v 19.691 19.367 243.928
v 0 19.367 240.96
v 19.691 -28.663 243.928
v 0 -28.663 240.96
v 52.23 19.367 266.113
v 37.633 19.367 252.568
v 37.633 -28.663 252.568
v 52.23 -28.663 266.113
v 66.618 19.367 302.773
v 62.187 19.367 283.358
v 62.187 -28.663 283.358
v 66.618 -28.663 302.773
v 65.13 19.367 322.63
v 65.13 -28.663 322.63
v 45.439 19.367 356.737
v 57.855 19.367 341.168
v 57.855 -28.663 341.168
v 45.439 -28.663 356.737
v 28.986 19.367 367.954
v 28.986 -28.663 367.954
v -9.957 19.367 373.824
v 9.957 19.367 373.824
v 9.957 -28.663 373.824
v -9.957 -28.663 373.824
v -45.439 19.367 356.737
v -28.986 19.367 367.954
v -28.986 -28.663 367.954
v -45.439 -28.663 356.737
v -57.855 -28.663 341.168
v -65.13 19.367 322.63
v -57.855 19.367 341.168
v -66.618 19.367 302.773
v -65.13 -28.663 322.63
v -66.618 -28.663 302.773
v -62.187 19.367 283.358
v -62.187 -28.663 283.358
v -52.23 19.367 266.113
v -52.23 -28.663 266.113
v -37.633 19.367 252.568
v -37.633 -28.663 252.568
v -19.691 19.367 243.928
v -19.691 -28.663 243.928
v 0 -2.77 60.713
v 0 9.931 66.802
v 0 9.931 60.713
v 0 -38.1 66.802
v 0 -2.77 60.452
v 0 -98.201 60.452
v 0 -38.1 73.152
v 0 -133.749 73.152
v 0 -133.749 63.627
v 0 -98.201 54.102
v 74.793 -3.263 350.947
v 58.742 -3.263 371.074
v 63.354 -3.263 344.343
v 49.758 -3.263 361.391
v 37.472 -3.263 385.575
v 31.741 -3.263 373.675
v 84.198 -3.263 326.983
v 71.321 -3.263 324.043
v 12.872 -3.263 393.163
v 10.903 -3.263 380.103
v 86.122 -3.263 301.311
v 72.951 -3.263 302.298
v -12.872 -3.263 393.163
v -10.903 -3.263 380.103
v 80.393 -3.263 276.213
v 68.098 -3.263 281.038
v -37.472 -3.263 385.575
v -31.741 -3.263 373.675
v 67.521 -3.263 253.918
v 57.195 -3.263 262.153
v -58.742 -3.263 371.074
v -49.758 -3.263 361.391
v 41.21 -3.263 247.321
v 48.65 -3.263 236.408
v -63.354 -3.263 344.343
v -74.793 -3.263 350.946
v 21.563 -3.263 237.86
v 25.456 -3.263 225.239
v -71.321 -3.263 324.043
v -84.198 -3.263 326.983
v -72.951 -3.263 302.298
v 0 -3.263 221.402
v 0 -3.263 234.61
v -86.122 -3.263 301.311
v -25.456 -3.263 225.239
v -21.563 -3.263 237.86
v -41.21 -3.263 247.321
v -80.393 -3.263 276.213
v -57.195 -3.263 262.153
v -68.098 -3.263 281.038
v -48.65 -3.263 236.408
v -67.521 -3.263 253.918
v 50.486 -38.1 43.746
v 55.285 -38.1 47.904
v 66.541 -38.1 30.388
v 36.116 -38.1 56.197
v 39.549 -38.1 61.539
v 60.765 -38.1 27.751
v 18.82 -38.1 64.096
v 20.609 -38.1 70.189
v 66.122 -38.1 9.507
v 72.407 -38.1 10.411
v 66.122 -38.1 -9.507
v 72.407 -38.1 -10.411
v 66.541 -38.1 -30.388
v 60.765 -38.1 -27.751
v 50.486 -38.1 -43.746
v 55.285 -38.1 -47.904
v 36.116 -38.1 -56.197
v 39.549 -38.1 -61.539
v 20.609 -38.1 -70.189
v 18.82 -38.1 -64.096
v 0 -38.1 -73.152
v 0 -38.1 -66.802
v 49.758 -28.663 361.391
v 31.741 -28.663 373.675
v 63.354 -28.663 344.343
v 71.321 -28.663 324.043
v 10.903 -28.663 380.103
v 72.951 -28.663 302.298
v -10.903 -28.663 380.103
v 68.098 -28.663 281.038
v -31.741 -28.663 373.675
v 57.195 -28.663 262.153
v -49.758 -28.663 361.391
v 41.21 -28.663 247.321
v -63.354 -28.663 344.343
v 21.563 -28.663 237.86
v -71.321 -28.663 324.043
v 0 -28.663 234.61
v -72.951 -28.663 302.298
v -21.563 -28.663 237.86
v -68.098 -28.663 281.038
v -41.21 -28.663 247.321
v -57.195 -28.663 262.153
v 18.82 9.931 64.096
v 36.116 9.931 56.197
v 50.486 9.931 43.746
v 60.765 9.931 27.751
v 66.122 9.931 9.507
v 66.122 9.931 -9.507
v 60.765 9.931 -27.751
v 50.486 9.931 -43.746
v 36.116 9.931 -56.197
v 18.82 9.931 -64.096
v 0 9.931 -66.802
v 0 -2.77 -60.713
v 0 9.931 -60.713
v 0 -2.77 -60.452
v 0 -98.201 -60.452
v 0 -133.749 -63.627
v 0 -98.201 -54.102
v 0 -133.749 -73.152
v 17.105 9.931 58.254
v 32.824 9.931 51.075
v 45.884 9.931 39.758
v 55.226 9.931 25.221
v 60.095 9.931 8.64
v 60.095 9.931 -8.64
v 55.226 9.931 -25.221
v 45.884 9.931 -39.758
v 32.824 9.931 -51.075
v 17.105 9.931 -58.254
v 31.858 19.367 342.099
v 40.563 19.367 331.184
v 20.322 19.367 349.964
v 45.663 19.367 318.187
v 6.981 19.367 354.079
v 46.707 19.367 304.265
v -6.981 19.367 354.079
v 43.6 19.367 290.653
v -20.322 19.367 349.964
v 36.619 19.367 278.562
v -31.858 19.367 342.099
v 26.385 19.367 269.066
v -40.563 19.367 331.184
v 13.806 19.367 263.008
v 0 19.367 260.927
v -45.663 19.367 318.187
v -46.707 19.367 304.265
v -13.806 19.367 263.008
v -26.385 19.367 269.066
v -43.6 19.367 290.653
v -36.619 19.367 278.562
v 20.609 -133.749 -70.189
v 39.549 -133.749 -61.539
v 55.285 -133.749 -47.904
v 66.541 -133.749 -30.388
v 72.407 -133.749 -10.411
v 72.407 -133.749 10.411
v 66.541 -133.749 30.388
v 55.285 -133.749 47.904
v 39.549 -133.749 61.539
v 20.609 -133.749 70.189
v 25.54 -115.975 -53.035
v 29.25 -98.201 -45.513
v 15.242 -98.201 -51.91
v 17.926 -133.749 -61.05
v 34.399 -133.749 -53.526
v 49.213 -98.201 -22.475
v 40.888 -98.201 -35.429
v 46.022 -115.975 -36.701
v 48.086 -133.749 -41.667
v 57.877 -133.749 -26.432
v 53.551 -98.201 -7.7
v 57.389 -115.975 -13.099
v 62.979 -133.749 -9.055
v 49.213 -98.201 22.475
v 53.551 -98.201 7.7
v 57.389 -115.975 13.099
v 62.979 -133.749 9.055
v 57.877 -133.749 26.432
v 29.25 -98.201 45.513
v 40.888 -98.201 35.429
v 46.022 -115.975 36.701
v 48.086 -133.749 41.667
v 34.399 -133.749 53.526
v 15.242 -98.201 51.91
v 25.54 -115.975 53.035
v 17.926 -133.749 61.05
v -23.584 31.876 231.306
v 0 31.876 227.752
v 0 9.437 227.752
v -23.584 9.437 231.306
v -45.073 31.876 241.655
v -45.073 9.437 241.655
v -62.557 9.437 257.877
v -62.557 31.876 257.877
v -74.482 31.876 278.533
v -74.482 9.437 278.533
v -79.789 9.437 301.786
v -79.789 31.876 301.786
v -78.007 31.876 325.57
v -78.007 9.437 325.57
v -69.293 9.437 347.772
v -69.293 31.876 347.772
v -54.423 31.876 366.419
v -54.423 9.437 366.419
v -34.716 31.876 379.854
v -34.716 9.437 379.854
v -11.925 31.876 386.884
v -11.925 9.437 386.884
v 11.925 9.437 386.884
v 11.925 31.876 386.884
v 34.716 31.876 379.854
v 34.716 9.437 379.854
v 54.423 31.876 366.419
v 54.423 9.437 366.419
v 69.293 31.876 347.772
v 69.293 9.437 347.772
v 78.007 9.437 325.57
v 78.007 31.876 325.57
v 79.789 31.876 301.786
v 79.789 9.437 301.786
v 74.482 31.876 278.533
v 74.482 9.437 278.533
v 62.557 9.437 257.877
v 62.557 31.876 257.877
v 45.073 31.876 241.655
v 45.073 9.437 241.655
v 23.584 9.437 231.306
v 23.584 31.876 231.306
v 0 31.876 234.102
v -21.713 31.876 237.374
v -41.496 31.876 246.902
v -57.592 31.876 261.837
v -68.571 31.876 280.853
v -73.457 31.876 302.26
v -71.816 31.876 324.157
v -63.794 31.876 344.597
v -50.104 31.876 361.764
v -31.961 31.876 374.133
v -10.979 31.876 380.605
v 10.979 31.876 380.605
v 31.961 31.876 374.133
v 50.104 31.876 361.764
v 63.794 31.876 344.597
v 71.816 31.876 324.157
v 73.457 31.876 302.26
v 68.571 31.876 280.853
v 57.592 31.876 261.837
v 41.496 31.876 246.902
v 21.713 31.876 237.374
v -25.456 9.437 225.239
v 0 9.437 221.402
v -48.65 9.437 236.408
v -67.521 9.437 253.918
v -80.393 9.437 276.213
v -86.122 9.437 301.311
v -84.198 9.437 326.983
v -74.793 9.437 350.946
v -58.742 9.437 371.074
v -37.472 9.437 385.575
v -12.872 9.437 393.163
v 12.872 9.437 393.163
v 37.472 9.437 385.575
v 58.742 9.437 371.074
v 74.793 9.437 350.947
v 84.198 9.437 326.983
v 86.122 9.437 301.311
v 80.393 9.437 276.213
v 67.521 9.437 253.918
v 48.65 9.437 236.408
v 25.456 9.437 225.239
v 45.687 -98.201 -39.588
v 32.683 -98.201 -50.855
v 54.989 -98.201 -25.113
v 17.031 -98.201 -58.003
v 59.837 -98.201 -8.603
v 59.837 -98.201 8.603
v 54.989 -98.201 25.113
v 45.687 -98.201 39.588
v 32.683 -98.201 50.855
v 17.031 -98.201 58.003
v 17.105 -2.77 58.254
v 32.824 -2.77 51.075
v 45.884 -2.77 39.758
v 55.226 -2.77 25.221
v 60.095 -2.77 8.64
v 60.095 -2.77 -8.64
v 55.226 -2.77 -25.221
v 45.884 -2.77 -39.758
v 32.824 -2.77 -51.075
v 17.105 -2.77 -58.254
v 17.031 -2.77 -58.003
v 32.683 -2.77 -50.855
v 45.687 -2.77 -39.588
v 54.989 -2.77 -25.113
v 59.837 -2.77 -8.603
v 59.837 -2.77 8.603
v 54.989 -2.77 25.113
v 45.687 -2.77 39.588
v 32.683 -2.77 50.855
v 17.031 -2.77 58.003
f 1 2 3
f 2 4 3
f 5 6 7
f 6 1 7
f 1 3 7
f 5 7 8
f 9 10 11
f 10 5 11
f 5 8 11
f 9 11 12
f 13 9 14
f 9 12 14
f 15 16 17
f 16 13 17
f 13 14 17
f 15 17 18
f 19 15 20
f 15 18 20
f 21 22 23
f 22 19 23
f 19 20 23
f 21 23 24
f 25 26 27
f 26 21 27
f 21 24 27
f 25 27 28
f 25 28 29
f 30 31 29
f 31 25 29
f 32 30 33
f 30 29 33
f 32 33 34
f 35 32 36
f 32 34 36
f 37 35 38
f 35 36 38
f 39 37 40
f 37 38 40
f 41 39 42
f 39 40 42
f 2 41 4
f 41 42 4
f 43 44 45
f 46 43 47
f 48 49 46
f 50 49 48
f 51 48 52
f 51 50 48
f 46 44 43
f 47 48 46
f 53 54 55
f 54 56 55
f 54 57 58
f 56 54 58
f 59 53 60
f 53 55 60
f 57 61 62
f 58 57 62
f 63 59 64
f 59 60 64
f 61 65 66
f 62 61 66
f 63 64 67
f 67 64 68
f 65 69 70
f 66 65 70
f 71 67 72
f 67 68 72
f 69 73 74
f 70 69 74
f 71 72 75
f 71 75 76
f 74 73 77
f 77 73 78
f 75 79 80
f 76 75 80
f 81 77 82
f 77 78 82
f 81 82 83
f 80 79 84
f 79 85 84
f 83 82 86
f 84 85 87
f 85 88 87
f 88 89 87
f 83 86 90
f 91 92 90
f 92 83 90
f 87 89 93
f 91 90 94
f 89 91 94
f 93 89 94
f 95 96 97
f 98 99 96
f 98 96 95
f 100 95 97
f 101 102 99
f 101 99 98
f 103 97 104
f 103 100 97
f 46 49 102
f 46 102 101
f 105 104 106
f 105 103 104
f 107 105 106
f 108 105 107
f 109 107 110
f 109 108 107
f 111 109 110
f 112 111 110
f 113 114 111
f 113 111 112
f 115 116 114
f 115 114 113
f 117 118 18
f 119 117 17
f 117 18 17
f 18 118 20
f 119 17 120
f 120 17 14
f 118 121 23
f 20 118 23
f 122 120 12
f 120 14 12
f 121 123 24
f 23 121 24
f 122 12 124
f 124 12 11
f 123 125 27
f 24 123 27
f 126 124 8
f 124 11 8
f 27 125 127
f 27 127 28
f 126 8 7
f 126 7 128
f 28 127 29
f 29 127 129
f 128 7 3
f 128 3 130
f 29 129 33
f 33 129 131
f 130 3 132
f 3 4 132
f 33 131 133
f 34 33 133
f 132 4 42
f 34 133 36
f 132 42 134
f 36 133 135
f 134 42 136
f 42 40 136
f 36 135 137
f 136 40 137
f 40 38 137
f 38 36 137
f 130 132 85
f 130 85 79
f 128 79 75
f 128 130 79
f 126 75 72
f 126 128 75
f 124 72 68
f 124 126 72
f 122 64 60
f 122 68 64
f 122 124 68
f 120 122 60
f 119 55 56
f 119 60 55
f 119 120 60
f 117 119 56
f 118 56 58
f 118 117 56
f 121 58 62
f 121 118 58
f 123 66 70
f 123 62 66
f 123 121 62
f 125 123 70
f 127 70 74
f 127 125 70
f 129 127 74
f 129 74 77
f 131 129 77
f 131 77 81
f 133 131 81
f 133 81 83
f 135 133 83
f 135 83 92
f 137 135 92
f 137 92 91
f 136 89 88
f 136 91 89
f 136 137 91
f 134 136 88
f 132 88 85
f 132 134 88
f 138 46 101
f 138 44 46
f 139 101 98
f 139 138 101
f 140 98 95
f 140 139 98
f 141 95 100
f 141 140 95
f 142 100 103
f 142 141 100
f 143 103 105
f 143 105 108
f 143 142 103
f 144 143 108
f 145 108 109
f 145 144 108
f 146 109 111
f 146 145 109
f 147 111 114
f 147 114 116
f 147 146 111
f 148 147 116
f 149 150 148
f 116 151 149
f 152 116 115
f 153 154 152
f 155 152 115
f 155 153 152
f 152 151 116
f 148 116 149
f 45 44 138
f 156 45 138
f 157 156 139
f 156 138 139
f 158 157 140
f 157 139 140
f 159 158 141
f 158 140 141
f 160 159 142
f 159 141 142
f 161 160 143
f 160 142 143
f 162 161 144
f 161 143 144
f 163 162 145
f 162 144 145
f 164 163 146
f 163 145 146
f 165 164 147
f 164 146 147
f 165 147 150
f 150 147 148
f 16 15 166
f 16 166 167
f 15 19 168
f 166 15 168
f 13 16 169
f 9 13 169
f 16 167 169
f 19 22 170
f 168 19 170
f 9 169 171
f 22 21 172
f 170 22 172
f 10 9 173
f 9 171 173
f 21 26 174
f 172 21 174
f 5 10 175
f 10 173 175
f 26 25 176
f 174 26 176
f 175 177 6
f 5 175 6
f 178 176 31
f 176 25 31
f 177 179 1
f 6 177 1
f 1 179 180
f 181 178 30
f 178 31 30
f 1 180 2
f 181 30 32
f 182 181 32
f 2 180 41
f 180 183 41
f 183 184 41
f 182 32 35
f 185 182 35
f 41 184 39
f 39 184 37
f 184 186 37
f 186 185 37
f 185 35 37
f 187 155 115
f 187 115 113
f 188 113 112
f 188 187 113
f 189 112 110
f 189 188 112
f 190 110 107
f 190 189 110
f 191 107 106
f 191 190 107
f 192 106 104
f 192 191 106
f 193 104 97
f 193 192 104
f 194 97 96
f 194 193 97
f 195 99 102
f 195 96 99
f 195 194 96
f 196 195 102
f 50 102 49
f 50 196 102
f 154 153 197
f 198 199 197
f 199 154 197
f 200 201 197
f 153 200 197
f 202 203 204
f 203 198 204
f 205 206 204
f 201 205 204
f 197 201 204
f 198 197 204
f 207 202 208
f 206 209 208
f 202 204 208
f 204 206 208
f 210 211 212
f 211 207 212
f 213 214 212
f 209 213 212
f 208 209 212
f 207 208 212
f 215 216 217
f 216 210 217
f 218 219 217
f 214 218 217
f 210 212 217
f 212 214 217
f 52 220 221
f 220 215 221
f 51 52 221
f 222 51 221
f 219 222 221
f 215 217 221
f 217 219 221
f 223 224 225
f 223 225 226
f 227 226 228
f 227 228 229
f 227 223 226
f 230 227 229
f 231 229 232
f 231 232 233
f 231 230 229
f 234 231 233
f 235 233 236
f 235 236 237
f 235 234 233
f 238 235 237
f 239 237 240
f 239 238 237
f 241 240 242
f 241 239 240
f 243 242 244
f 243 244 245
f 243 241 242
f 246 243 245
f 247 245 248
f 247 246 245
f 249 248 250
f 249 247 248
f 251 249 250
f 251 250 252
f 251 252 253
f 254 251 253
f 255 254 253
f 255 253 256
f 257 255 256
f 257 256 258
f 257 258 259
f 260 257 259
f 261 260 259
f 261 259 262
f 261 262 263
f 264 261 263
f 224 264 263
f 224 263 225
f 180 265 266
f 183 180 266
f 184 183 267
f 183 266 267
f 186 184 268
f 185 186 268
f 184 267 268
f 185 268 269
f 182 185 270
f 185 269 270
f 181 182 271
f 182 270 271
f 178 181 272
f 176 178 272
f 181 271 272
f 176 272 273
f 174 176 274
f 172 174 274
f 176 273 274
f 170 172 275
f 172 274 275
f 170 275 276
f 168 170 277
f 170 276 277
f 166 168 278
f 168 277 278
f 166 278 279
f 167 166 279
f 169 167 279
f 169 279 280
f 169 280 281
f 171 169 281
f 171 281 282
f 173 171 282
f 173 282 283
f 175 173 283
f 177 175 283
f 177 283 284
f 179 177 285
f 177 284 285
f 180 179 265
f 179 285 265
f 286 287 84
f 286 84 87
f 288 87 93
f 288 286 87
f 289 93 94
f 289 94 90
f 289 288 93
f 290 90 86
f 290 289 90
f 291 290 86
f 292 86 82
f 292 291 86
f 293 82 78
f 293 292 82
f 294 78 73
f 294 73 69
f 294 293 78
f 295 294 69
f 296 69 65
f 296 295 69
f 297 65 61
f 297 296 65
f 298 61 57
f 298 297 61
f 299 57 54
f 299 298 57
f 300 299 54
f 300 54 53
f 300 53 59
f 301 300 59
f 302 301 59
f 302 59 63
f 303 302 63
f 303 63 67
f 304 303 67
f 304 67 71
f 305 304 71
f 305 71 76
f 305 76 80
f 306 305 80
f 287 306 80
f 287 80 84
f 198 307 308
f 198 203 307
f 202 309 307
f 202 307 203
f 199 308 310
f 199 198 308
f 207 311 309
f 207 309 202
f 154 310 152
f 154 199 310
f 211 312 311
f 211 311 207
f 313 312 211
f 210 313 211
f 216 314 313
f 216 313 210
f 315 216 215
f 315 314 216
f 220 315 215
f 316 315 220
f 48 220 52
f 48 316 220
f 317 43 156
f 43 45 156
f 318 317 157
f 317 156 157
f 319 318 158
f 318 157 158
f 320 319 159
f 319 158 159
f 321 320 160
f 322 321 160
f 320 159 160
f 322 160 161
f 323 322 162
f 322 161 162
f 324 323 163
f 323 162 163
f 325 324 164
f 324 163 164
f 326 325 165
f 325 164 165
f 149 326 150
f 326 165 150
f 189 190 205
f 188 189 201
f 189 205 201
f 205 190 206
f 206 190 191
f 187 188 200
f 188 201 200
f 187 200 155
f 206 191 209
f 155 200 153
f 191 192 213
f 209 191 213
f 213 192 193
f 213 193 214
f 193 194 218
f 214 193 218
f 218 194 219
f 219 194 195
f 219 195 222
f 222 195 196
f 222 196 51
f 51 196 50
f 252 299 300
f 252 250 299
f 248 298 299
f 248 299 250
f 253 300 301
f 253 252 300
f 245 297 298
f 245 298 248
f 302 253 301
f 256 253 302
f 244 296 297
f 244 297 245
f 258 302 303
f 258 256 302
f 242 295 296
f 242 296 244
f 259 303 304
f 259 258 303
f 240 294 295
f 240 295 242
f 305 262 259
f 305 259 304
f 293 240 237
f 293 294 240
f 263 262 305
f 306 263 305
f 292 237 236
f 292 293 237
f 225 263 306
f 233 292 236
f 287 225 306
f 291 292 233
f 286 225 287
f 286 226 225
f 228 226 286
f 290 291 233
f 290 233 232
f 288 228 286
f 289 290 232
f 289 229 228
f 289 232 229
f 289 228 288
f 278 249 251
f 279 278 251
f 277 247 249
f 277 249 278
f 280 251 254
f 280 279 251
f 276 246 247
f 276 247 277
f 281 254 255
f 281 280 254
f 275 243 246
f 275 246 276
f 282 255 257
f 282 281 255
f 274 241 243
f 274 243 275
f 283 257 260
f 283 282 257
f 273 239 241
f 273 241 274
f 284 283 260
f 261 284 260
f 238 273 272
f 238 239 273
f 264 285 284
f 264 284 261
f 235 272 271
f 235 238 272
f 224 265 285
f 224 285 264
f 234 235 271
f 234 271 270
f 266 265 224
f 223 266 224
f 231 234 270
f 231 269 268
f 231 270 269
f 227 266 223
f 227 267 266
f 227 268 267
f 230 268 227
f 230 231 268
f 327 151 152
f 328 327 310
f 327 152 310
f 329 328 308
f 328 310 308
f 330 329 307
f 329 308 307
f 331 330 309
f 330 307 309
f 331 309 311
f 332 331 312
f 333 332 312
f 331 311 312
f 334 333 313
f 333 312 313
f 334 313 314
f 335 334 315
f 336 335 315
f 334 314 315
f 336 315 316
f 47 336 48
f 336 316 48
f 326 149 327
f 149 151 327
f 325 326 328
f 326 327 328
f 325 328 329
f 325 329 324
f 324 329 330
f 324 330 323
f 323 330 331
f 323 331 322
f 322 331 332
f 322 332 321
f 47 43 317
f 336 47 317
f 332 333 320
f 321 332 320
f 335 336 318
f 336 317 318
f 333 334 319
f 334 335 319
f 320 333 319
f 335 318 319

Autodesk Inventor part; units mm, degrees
ref_plane "YZ Plane" through (0, 0, 0) normal (1, 0, 0) x (0, 1, 0)
ref_plane "XZ Plane" through (0, 0, 0) normal (0, 1, 0) x (-1, 0, 0)
ref_plane "XY Plane" through (0, 0, 0) normal (0, 0, 1) x (1, 0, 0)
sketch "Sketch1" plane through (0, 0, 0) normal (0, 0, 1) x (1, 0, 0)
  line L0 (0, 25.4) -> (-28.702, 25.4) construction
  line L1 (0, 25.4) -> (-86.36, 25.4) construction
  line L2 (-86.36, 25.4) -> (-80.01, 25.4) construction
  line L3 (-80.01, 25.4) -> (-73.66, 22.4389) construction
  line L4 (-80.01, 25.4) -> (-80.01, 22.4389) construction
  line L5 (-80.01, 0) -> (-86.36, 0)
  line L6 (-28.702, 59.6457) -> (-28.702, -91.9304) construction
  arc A0 (-28.9184, -4.2142) -> (-32.3684, 3.1843) centre (-35.052, -2.5707) ccw
  line L7 (-67.31, -147.4937) -> (-28.9184, -4.2142)
  line L8 (-80.01, 22.4389) -> (-73.66, 22.4389)
  line L9 (-80.01, 22.4389) -> (-80.01, 0)
  line L10 (-73.66, 22.4389) -> (-32.3684, 3.1843)
  line L11 (-28.702, -2.5707) -> (-60.452, -2.5707) construction
  line L12 (-60.452, 16.28) -> (-60.452, -121.8993) construction
  line L13 (-60.452, -121.8993) -> (-54.102, -121.8993) construction
  line L14 (-54.102, -121.8993) -> (-54.102, -98.2008) construction
  line L15 (-54.102, -98.2008) -> (-60.452, -98.2008)
  line L16 (-60.452, 16.28) -> (-60.452, 6.755) construction
  line L17 (-60.452, 16.28) -> (-60.452, 9.93) construction
  line L18 (-60.452, 9.93) -> (-46.8344, 9.93)
  line L19 (-60.452, 9.93) -> (-60.452, -98.2008)
  line L20 (-86.36, 0) -> (-86.36, -12.7) construction
  line L21 (-60.452, -12.7) -> (-73.152, -12.7) construction
  line L22 (-86.36, -12.7) -> (-86.36, -25.4) construction
  line L23 (-86.36, -25.4) -> (-86.36, -88.9) construction
  line L24 (-86.36, -88.9) -> (-73.66, -88.9) construction
  line L25 (-73.66, -88.9) -> (-73.66, -25.4) construction
  line L26 (-86.36, -25.4) -> (-73.66, -25.4)
  line L27 (-73.66, -25.4) -> (-73.66, -88.9)
  line L28 (-73.66, -88.9) -> (-86.36, -88.9)
  line L29 (-86.36, -12.7) -> (-73.152, -12.7)
  line L30 (-73.152, -133.7486) -> (-63.627, -133.7486)
  line L31 (-73.66, -88.9) -> (-73.66, -147.4937)
  line L32 (-73.66, -147.4937) -> (-67.31, -147.4937)
  line L33 (-73.152, -12.7) -> (-73.152, -133.7486)
  line L34 (-80.01, -25.4) -> (-80.01, -31.3436)
  line L35 (-80.01, -31.3436) -> (-86.36, -31.3436)
  line L36 (-86.36, 0) -> (-86.36, -25.4)
  line L37 (-86.36, -31.3436) -> (-86.36, -88.9)
  line L38 (0, -319.0244) -> (0, 122.7573) projected
  point P0 (0, 0)
  point P1 (-86.36, -255.9127)
  point P2 (-76.835, 22.4389)
  dimension "d0" = 28.702
  dimension "d1" = 86.36
  dimension "d2" = 6.35
  dimension "d3" = 25
  dimension "d5" = 25.4
  dimension "d6" = 25.4
  dimension "d8" = 12.7
  dimension "d11" = 6.35
  dimension "d12" = 31.75
  dimension "d13" = 6.35
  dimension "d15" = 6.35
  dimension "d16" = 12.7
  dimension "d17" = 12.7
  dimension "d18" = 12.7
  dimension "d19" = 63.5
  dimension "d20" = 12.7
  dimension "d22" = 9.525
  dimension "d23" = 6.35
  dimension "d25" = 5.9436
  dimension "d26" = 15
revolve "Revolution2" add sketch "Sketch1" angle 360 about axis through (0, -10, 0) along (0, 1, 0) contours L9 L8 L10 L18 L19 L15 L7 L30 L33 L29 L36 L5
sketch "Sketch2" plane through (0, 0, 0) normal (0, 1, 0) x (-1, 0, 0)
  line L0 (0, -114.5678) -> (107.9834, -114.5678)
  line L1 (107.9834, -114.5678) -> (107.9834, 108.3126)
  line L2 (107.9834, 108.3126) -> (0, 108.3126)
  line L3 (0, 108.3126) -> (0, -114.5678)
  point P0 (0, 0)
extrude "Extrusion1" cut sketch "Sketch2" along normal through all both and the other way through all
sketch "Sketch3" plane through (0, -133.7486, -73.152) normal (-1, 0, 0) x (0, 0, 1)
  line L0 (6.35, 143.6785) -> (6.35, 121.0486)
  line L1 (6.35, 121.0486) -> (6.35, 95.6486)
  line L2 (0, 95.6486) -> (6.35, 95.6486)
  line L3 (0, 121.0486) -> (-13.208, 121.0486)
  line L4 (-13.208, 121.0486) -> (-13.208, 133.7486) projected
  line L5 (-13.208, 121.0486) -> (-13.208, 133.7486)
  line L6 (-13.208, 133.7486) -> (-6.858, 133.7486)
  line L7 (-6.858, 133.7486) -> (-6.858, 156.1875)
  line L8 (-0.508, 156.1875) -> (26.3176, 143.6785) projected
  line L9 (-6.858, 156.1875) -> (-0.508, 156.1875)
  line L10 (-0.508, 156.1875) -> (26.3176, 143.6785)
  line L11 (12.7, 143.6785) -> (26.3176, 143.6785)
  line L12 (6.35, 143.6785) -> (12.7, 143.6785)
  line L13 (314.1117, 153.1152) -> (314.1117, 130.4853)
  line L14 (314.1117, 130.4853) -> (314.1117, 105.0853)
  line L15 (307.7617, 105.0853) -> (314.1117, 105.0853)
  line L16 (307.7617, 130.4853) -> (294.5537, 130.4853)
  line L17 (294.5537, 130.4853) -> (294.5537, 143.1853)
  line L18 (294.5537, 143.1853) -> (300.9037, 143.1853)
  line L19 (300.9037, 143.1853) -> (300.9037, 165.6242)
  line L20 (307.2537, 165.6242) -> (334.0793, 153.1152)
  line L21 (300.9037, 165.6242) -> (307.2537, 165.6242)
  line L22 (320.4617, 153.1152) -> (334.0793, 153.1152)
  line L23 (314.1117, 153.1152) -> (320.4617, 153.1152)
  line L24 (334.0793, 153.1152) -> (380.9169, 153.1152) construction
  line L25 (380.9169, 153.1152) -> (380.9169, 203.9215) construction
  line L26 (307.7617, 130.4853) -> (307.7617, 105.0853)
  line L27 (0, 121.0486) -> (0, 95.6486)
  line L28 (0, 0) -> (0, 121.0486) projected
  point P0 (73.152, 133.7486)
  dimension "d32" = 6.35
  dimension "d34" = 6.35
  dimension "d35" = 46.8376
revolve "Revolution3" add sketch "Sketch3" angle 360 about axis through (0, 19.3666, 307.7649) along (0, 1, 0) contours L13 L14 L15 L26 L16 L17 L18 L19 L21 L20 L22 L23
sketch "Sketch6" plane through (0, -133.7486, -73.152) normal (-1, 0, 0) x (0, 0, 1)
  line L0 (0, 121.0486) -> (0, 95.6486)
  line L1 (0, 95.6486) -> (6.35, 95.6486)
  line L2 (0, 121.0486) -> (-13.208, 121.0486)
  line L3 (-13.208, 121.0486) -> (-13.208, 133.7486) projected
  line L4 (-13.208, 121.0486) -> (-13.208, 133.7486)
  line L5 (-13.208, 133.7486) -> (-6.858, 133.7486)
  line L6 (-6.858, 133.7486) -> (-6.858, 156.1875)
  line L7 (-0.508, 156.1875) -> (26.3176, 143.6785) projected
  line L8 (-6.858, 156.1875) -> (-0.508, 156.1875)
  line L9 (-0.508, 156.1875) -> (26.3176, 143.6785)
  line L10 (6.35, 95.6486) -> (6.35, 143.68)
  line L11 (6.35, 143.68) -> (26.3176, 143.6785)
  line L12 (26.3176, 143.6785) -> (92.5608, 143.6785) construction
  line L13 (73.152, 133.7486) -> (73.152, 183.9478) construction
  line L14 (119.9864, 143.6785) -> (26.3176, 143.6785) construction
  line L15 (26.3176, 143.6785) -> (73.152, 143.6785) construction
  dimension "d37" = 25.4
  dimension "d38" = 6.35
  dimension "d39" = 6.35
  dimension "d40" = 48.0314
revolve "Revolution4" cut sketch "Sketch6" angle 360 about axis through (0, 0, 0) along (0, 1, 0)
sketch "Sketch7" plane through (0, 9.93, 0) normal (0, -1, 0) x (1, 0, 0)
  point P0 (0, 0)
sketch "Sketch8" plane through (0, 9.93, 0) normal (0, -1, 0) x (1, 0, 0)
  point P0 (0, 0)
sketch "Sketch9" plane through (0, 9.93, 0) normal (0, -1, 0) x (1, 0, 0)
  circle A0 centre (0, 0) radius 60.7129
extrude "Extrusion2" cut sketch "Sketch9" along normal mid plane 25.4
properties part number "2 part phenolic sketch" material "Phenolic Resin"
